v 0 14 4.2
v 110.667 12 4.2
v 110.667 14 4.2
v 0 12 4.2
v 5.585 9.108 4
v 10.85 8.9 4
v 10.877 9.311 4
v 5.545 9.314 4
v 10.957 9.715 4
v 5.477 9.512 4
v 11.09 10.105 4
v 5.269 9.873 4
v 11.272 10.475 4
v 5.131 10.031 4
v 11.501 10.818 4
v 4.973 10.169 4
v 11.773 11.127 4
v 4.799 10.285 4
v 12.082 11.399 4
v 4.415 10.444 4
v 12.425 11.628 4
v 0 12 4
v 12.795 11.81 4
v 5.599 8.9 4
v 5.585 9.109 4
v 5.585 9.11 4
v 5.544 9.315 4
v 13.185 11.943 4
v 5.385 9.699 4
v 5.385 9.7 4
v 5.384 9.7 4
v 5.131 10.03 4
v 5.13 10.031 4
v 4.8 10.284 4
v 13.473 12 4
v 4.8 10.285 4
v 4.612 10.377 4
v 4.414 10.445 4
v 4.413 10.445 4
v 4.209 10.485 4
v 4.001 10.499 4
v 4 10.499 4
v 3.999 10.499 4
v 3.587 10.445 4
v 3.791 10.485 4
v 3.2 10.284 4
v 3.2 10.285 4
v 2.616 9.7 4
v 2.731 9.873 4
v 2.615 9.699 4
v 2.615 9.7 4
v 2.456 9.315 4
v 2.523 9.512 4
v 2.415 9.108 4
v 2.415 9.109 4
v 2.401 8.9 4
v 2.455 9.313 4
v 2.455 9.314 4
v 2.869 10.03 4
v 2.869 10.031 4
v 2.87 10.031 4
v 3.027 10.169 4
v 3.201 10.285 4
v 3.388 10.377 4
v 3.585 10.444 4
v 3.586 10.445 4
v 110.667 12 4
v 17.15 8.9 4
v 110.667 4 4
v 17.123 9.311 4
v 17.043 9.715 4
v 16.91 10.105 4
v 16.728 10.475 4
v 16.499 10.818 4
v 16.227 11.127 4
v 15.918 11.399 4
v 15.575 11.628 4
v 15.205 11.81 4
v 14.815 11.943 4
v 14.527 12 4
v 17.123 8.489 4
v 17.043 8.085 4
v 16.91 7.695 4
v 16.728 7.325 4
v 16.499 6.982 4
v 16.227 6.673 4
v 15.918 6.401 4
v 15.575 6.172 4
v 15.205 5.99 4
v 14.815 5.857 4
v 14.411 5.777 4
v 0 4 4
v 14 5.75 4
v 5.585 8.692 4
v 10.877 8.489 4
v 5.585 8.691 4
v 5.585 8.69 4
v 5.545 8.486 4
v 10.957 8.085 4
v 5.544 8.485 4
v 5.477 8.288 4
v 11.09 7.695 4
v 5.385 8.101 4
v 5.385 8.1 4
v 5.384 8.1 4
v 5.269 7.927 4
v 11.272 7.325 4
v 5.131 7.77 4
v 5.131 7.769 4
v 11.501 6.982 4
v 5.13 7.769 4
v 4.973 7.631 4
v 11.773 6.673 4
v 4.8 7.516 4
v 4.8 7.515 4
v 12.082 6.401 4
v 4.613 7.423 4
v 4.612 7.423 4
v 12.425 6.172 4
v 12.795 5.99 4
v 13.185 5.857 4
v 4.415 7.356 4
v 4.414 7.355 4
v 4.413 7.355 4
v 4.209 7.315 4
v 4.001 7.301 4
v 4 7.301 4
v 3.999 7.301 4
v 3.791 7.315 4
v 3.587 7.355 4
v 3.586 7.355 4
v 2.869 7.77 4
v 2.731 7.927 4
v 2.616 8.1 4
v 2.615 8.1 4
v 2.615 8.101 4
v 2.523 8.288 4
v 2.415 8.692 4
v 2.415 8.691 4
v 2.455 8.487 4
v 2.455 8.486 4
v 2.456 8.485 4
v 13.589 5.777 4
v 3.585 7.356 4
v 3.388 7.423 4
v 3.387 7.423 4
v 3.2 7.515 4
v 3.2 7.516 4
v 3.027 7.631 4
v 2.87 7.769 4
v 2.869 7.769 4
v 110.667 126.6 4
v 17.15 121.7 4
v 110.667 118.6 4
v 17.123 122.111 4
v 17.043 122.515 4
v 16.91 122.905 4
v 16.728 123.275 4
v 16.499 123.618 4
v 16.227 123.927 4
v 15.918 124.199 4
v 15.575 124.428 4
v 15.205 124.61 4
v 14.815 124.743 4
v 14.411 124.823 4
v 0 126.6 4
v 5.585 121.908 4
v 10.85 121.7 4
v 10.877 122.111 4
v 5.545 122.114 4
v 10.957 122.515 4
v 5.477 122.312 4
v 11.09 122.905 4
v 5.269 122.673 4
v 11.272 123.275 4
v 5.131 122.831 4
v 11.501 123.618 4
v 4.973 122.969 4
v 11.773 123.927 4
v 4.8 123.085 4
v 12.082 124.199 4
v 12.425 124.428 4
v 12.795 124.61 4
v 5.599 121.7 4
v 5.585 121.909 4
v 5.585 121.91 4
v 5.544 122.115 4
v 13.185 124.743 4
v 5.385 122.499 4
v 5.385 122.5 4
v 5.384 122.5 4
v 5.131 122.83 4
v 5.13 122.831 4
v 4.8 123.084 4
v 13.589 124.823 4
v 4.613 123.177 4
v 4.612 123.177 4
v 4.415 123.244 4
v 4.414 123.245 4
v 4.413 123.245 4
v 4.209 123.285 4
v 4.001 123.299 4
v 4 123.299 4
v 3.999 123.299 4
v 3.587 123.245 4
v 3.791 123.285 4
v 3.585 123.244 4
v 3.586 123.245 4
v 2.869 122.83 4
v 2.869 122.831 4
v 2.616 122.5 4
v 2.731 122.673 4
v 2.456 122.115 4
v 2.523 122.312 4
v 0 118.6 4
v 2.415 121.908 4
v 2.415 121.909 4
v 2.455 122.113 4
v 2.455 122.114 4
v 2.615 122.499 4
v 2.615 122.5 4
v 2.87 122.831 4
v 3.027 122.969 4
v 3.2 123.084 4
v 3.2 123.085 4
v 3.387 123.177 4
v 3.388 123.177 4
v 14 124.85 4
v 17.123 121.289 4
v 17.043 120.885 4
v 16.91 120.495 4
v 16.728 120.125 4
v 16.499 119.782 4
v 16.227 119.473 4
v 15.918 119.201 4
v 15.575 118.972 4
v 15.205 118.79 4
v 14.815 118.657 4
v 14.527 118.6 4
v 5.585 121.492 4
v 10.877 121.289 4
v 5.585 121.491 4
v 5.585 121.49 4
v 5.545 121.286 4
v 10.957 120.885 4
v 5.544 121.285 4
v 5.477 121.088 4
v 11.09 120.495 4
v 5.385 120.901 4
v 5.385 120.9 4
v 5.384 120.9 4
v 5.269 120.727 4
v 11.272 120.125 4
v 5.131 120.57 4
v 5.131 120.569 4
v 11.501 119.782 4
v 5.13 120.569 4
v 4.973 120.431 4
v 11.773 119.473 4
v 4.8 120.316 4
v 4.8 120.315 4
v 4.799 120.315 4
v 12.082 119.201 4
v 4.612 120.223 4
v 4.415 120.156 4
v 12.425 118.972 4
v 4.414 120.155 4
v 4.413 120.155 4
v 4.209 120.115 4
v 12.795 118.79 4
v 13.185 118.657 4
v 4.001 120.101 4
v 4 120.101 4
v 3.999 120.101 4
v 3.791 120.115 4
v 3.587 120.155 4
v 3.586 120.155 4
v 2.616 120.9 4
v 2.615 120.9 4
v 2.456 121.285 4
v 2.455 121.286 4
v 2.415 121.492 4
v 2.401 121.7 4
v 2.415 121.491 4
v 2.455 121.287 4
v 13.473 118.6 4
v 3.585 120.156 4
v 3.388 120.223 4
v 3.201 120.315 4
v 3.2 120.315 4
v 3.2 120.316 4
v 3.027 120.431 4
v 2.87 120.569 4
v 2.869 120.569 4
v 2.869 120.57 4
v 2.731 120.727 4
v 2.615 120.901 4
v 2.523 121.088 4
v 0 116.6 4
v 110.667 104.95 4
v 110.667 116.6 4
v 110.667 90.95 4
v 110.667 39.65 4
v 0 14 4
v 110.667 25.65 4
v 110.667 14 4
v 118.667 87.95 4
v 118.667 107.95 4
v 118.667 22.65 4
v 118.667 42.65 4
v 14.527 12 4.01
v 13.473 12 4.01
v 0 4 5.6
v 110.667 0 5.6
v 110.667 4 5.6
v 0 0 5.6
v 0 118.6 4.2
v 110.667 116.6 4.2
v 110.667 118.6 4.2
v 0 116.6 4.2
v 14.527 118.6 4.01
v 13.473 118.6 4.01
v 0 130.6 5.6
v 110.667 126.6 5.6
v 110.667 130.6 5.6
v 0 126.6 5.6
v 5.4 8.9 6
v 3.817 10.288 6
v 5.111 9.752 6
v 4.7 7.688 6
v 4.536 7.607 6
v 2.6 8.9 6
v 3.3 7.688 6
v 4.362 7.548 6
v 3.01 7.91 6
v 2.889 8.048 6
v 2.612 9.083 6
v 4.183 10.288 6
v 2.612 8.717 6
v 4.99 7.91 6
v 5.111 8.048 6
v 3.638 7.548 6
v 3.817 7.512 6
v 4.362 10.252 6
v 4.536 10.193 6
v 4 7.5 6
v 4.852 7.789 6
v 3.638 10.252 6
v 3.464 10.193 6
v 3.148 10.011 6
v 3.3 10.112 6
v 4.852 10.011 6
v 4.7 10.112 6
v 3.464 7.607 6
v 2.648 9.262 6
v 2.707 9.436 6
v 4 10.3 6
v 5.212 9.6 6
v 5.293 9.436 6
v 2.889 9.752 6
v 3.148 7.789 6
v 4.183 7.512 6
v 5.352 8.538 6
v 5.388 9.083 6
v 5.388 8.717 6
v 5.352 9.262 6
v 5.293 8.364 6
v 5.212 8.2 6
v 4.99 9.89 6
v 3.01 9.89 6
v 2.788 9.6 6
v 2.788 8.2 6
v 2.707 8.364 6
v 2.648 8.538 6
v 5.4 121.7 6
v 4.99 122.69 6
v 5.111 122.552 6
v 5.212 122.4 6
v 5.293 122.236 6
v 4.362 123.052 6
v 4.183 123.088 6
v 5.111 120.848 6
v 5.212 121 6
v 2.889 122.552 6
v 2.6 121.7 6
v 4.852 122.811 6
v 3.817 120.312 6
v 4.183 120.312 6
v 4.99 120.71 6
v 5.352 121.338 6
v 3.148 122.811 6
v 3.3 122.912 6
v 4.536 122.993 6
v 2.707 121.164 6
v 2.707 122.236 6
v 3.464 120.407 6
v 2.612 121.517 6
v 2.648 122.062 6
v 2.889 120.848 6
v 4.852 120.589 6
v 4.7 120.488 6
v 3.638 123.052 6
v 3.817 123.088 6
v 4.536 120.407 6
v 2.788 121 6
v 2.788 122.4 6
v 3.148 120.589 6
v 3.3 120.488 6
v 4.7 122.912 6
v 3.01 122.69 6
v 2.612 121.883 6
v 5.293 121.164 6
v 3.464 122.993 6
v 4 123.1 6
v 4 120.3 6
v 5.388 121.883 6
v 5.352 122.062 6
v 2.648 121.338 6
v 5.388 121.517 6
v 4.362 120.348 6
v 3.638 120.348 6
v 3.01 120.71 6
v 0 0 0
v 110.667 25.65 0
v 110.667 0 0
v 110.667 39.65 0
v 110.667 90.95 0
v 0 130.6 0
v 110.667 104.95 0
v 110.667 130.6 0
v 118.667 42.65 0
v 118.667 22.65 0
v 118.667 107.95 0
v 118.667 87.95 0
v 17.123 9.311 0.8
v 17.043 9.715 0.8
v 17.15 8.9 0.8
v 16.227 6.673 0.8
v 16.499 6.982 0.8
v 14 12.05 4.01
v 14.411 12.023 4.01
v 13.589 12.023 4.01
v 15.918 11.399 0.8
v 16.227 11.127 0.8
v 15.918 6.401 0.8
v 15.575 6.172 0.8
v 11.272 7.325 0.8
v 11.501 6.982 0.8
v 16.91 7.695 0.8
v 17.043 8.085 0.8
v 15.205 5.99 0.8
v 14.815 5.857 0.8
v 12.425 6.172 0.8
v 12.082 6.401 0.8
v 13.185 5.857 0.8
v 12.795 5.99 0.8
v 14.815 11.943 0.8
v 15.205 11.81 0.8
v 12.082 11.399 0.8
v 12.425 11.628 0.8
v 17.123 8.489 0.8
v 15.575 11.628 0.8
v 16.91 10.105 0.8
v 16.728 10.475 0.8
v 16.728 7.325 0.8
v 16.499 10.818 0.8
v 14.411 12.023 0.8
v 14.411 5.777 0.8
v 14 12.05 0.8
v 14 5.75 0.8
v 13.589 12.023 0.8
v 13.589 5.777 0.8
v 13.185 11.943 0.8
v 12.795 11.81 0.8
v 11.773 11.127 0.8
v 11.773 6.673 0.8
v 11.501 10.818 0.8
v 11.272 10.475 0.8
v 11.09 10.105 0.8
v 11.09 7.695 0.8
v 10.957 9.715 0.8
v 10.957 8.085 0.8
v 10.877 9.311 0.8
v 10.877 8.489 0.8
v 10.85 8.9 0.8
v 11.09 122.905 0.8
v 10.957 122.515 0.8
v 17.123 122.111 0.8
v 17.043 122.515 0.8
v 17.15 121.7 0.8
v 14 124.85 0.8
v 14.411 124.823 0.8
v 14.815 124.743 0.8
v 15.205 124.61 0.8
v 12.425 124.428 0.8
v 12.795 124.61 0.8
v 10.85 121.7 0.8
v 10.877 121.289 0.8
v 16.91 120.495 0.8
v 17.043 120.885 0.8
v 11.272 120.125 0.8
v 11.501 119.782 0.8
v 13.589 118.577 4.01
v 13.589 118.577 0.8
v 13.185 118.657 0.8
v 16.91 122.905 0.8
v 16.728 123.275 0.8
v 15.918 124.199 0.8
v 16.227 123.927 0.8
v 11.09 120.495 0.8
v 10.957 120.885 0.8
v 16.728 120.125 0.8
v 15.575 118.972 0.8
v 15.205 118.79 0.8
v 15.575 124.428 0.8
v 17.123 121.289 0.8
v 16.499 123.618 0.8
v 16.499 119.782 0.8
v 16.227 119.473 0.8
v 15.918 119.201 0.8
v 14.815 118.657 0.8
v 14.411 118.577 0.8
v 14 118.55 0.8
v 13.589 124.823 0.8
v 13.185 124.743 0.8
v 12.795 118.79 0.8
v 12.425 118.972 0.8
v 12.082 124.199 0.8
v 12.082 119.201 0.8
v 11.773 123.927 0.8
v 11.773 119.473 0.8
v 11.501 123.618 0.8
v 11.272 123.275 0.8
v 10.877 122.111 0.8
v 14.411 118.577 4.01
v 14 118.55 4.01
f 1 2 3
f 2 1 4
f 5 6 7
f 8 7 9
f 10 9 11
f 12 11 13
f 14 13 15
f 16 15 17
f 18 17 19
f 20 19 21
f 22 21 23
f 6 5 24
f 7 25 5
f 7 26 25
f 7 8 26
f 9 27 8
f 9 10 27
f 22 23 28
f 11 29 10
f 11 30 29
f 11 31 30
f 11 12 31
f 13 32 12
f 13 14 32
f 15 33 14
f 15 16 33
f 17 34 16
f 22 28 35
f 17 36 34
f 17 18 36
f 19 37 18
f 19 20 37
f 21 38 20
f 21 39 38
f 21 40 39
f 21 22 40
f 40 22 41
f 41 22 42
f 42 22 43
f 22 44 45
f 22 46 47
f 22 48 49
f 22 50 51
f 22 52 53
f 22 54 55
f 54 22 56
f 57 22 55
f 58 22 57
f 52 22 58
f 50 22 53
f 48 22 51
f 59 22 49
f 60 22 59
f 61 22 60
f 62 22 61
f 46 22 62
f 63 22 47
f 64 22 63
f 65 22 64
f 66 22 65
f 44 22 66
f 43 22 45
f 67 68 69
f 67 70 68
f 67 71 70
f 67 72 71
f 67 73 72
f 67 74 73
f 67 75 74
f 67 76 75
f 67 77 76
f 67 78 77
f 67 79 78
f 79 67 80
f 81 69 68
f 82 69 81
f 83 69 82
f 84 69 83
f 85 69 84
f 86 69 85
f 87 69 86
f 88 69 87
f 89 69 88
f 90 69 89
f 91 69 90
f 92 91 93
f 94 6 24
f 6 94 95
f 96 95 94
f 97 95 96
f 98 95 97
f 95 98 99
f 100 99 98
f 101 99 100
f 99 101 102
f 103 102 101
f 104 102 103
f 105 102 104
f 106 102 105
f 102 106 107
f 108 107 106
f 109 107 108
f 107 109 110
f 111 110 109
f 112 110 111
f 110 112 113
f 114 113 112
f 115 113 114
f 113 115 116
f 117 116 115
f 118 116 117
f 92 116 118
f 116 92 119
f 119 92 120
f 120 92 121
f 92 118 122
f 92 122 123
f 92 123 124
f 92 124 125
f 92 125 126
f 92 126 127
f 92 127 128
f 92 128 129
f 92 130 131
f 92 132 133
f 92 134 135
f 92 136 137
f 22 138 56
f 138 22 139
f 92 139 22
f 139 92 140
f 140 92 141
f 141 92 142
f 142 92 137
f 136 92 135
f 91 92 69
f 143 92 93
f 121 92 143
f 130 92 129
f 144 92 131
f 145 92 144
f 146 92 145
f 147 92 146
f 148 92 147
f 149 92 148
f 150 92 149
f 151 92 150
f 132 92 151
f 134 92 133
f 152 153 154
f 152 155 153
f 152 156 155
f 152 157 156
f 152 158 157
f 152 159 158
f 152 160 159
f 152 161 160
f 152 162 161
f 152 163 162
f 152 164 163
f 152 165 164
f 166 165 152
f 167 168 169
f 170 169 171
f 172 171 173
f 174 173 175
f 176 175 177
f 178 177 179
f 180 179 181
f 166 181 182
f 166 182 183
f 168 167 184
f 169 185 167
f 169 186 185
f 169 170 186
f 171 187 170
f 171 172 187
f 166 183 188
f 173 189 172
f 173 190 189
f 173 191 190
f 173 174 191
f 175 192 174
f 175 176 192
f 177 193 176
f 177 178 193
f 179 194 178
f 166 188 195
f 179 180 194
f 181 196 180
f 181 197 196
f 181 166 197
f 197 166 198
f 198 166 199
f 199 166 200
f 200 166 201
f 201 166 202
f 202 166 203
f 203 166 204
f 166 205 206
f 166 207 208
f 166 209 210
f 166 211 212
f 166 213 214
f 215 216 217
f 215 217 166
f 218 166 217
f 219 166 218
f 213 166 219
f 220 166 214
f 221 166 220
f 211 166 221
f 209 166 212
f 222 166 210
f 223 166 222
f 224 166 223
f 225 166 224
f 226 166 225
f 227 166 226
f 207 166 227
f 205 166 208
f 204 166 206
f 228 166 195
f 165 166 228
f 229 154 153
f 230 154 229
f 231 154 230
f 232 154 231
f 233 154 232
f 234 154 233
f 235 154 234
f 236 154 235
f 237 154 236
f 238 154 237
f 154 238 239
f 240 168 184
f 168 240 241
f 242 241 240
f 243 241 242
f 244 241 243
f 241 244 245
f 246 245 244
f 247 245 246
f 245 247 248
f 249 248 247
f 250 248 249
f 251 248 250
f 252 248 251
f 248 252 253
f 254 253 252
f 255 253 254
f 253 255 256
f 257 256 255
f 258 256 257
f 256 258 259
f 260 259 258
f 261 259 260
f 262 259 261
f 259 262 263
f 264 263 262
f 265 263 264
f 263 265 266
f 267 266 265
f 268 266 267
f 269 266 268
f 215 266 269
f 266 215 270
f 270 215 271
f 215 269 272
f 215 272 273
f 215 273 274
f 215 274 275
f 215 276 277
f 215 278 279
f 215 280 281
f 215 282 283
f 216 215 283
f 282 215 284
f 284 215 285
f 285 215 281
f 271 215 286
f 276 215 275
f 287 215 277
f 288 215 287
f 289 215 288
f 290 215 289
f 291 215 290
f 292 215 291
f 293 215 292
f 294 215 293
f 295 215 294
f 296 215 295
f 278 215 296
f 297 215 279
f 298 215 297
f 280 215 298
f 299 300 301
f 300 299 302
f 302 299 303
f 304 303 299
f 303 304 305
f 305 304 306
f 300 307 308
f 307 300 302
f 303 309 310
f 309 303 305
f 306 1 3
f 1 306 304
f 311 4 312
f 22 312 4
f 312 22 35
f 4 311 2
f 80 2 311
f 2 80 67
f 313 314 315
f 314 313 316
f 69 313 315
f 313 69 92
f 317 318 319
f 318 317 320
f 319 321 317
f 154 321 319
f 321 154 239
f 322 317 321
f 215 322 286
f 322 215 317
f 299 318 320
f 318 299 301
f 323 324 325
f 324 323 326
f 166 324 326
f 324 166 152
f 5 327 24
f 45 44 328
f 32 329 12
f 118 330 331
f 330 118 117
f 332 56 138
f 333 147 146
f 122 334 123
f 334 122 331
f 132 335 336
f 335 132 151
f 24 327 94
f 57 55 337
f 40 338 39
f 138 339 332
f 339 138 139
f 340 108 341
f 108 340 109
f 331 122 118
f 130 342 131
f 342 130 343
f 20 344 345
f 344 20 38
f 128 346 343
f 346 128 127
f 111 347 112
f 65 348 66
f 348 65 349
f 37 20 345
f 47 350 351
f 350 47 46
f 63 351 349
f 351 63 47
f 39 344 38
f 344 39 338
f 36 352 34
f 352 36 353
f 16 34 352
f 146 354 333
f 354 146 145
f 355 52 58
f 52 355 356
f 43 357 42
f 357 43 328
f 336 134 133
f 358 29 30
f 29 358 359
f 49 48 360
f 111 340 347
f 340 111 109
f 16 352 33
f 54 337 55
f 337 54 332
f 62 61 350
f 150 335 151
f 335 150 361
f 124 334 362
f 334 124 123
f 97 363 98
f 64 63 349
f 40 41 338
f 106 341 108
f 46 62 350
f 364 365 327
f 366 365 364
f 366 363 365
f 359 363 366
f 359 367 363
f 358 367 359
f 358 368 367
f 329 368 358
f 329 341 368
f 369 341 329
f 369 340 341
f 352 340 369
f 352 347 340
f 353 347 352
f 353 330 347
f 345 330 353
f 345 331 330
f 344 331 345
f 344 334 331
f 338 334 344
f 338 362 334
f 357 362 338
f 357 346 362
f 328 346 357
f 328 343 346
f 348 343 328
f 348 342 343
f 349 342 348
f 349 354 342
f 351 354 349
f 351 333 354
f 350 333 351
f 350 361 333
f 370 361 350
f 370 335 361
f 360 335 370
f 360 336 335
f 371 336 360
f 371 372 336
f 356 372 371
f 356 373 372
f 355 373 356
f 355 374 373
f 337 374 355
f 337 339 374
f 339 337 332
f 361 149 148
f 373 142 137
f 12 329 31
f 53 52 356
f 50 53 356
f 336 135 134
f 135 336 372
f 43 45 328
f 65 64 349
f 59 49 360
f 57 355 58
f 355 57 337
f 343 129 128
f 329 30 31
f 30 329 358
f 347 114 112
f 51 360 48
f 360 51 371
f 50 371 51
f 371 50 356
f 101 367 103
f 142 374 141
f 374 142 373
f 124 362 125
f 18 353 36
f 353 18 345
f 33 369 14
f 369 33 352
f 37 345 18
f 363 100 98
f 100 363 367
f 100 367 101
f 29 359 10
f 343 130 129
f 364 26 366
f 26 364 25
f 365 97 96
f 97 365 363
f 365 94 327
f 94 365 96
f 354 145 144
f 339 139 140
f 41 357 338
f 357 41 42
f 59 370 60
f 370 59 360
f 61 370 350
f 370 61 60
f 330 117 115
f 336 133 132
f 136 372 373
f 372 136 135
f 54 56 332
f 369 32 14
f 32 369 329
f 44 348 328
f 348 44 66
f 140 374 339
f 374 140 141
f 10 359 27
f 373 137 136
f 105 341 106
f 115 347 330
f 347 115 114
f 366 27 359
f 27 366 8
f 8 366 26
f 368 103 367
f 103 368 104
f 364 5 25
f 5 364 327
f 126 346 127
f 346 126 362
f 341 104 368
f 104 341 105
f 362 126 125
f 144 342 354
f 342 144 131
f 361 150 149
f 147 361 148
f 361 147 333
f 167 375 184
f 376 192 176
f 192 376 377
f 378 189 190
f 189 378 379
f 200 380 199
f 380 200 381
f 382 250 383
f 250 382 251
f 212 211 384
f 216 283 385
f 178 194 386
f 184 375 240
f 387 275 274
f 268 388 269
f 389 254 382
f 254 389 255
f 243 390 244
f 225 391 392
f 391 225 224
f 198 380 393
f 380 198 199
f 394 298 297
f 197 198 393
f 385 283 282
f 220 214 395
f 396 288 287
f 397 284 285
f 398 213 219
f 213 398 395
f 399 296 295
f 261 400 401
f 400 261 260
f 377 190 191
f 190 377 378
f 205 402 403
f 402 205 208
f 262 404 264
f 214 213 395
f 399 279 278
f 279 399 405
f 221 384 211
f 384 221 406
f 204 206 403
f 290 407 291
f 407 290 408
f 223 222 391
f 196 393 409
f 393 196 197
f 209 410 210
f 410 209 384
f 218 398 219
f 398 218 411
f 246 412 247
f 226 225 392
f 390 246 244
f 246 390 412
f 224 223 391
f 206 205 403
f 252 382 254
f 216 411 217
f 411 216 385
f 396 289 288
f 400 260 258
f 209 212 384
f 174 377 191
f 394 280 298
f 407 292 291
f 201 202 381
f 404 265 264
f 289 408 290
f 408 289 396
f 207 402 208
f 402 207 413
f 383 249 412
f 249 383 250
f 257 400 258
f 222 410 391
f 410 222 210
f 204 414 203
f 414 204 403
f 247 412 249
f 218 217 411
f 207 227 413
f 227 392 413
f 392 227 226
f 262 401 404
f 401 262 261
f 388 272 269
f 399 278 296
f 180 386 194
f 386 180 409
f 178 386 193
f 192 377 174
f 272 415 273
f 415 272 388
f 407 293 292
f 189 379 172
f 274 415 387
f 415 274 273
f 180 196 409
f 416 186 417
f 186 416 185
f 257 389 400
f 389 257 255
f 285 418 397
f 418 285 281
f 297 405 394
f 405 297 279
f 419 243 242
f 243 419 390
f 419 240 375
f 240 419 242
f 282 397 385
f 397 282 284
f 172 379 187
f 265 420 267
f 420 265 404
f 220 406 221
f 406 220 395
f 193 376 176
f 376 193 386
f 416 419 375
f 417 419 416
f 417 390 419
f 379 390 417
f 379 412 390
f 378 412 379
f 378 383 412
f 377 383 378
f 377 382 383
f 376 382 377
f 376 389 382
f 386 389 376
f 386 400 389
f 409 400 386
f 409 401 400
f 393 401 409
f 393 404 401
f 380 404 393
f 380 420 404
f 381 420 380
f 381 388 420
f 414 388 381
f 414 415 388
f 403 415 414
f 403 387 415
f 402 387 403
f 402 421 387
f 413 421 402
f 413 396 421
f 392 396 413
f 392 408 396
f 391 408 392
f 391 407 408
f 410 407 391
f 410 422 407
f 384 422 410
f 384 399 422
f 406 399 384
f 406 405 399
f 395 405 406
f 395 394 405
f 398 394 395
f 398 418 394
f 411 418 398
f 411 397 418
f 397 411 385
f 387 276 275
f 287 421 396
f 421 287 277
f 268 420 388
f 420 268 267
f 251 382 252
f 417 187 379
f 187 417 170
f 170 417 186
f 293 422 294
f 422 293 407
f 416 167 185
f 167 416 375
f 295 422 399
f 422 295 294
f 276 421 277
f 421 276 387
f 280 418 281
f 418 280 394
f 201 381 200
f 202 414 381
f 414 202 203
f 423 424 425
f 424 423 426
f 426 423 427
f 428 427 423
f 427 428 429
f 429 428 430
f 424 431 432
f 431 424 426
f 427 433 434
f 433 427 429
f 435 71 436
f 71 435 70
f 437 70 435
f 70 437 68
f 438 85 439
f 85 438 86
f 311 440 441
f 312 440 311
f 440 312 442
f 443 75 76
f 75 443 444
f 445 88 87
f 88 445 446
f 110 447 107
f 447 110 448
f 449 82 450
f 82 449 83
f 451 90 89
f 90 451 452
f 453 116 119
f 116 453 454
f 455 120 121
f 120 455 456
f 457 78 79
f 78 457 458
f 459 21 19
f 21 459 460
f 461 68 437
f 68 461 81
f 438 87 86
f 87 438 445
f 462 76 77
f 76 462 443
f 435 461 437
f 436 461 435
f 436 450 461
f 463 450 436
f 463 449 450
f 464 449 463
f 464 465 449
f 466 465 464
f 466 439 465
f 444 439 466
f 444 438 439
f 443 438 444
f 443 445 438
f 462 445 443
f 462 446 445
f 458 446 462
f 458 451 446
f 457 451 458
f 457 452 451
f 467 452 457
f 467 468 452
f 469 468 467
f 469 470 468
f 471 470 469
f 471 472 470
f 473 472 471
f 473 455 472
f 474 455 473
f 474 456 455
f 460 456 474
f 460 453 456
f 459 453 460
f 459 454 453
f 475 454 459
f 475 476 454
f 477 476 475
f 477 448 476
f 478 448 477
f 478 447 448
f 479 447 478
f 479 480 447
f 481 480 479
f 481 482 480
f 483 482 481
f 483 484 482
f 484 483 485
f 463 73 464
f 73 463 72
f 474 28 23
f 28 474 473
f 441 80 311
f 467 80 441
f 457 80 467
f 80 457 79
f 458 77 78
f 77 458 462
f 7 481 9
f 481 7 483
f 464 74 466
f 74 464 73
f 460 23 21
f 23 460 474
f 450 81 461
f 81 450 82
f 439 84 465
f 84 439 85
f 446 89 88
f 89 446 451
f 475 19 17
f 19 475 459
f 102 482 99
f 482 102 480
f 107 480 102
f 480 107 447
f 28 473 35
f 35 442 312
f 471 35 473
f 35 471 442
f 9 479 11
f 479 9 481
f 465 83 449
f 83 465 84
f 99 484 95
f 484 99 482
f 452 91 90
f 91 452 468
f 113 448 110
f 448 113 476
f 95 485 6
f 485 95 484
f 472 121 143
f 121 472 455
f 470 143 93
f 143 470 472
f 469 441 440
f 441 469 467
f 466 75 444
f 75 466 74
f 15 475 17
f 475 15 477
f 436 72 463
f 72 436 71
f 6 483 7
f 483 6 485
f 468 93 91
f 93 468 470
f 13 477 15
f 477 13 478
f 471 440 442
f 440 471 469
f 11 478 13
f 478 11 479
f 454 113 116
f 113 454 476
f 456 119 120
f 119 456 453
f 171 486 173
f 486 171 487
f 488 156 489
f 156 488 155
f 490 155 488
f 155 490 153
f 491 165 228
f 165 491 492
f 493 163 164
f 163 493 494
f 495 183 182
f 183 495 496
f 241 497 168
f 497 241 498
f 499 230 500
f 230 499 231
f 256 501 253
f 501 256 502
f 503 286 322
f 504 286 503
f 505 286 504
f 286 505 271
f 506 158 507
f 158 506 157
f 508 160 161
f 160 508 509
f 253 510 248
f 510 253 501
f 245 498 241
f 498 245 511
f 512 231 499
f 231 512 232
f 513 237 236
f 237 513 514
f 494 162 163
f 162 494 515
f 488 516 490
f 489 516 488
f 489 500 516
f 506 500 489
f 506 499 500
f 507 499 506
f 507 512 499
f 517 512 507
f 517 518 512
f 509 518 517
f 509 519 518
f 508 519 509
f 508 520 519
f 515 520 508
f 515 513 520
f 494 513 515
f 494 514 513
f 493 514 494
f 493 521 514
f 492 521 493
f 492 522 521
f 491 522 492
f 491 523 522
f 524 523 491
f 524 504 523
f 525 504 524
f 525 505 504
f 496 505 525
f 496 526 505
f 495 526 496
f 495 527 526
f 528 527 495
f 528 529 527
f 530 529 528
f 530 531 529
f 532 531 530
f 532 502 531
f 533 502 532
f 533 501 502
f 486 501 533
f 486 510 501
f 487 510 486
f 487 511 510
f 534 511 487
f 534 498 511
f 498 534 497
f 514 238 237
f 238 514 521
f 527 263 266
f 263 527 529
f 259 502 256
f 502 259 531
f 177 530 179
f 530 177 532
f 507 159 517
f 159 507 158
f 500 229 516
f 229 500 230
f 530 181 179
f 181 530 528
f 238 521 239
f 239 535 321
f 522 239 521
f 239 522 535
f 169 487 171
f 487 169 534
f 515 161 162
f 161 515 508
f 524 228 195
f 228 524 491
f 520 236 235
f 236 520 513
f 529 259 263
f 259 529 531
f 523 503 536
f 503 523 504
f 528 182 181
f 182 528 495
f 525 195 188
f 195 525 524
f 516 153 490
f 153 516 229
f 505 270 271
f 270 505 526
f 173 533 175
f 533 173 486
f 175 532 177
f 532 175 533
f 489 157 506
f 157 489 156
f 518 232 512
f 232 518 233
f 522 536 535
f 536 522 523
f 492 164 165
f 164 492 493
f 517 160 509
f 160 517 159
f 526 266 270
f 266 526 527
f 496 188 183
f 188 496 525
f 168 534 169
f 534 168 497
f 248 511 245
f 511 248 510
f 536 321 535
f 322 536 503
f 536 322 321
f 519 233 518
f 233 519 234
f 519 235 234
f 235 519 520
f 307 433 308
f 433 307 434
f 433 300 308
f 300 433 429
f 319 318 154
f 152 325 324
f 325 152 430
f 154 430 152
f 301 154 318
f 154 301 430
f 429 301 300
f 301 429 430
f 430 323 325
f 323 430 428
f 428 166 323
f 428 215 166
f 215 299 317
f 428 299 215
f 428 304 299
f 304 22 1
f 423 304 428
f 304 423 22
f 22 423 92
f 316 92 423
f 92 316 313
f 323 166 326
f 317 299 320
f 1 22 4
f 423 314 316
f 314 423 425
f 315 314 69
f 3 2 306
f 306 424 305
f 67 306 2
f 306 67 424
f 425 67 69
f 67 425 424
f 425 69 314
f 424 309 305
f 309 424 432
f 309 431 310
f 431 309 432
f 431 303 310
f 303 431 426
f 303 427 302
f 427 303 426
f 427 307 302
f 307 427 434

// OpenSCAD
// file: ../parameters.scad
// Millimetres. Rebuild every mating part after changing these settings.
paper_width = 102;
paper_thickness = 0.30; // Measure an unexposed offcut; not a Fuji specification.
paper_side_clearance = 0.30;
guide_height = 0.20; // Below the emulsion plane: no lip over the long edges.
deck_thickness = 4;
end_allowance = 20;
side_shelf = 14;
outer_rail_width = 4;
outer_rail_height = 1.6;
mask_thickness = 4.8;
mask_edge_land = 0.8;
mask_bevel = 3.2;
mask_side_clearance = 0.4;
magnet_diameter = 6;
magnet_thickness = 3;
magnet_diameter_clearance = 0.3; // Diametral; glue fit, not a press fit.
magnet_depth_clearance = 0.2;
locator_diameter = 3.2;
locator_height = 2;
locator_clearance = 0.5; // Diametral.
cover_thickness = 3;
cover_pin_diameter = 2.8;
cover_pin_height = 2.2;
cover_pin_clearance = 0.6; // Diametral.
cover_lap = 0.8;
cover_lap_height = 1;
cover_clearance = 0.2;
joint_clearance = 0.2;
joint_depth = 8;
build_size = [180, 180, 180];
bed_margin = 3;
$fn = 48;
eps = 0.01;

image_169 = paper_width * 16 / 9;
image_43 = paper_width * 4 / 3;
base_length = image_169 + 2 * end_allowance;
channel_width = paper_width + 2 * paper_side_clearance;
base_width = channel_width + 2 * side_shelf;
rail_inner = base_width / 2 - outer_rail_width;
mask_width = 2 * (rail_inner - mask_side_clearance);
paper_z = deck_thickness + paper_thickness;
mask_top = paper_z + mask_thickness;
magnet_x = base_length / 2 - 14;
locator_x = base_length / 2 - 4;
attachment_y = channel_width / 2 + 5.1;
cover_pin_x = base_length / 2 - 10;
cover_end = base_length / 2 - 3;
band_width = paper_width / 5;
cover_lap_gap = 0.2;

function image_length(format) = format == "16:9" ? image_169 : image_43;
function band_center(i) = -paper_width / 2 + (i + 0.5) * band_width;

module check_parameters() {
    assert(paper_width >= 80 && paper_width <= 105, "Supported paper width: 80 to 105 mm.");
    assert(paper_thickness >= 0.25 && paper_thickness <= 0.6, "Measure paper thickness (0.25 to 0.6 mm).");
    assert(guide_height > 0 && guide_height <= paper_thickness - 0.05,
        "Channel guides must remain below the emulsion surface.");
    assert(paper_side_clearance >= 0.15 && paper_side_clearance <= 0.6);
    assert(deck_thickness >= magnet_thickness + magnet_depth_clearance + 0.8);
    assert(mask_thickness >= magnet_thickness + magnet_depth_clearance + 1.4);
    assert(end_allowance >= 20 && end_allowance <= 23);
    assert(mask_edge_land >= 0.8 && mask_bevel <= mask_thickness - mask_edge_land);
    assert(mask_side_clearance >= 0.25 && mask_side_clearance <= 0.6);
    assert(magnet_diameter == 6 && magnet_thickness == 3, "Attachment layout is for 6 x 3 mm magnets.");
    assert(magnet_diameter_clearance >= 0.1 && magnet_diameter_clearance <= 0.5);
    assert(magnet_depth_clearance >= 0.1 && magnet_depth_clearance <= 0.3);
    assert(mask_width / 2 - attachment_y - (magnet_diameter + magnet_diameter_clearance) / 2 >= 1.2);
    assert(locator_height + 0.3 < mask_thickness && locator_clearance >= 0.3);
    assert(cover_thickness >= 2.8 && cover_thickness <= 4);
    assert(cover_pin_height < cover_thickness && cover_pin_clearance >= 0.4);
    assert(cover_lap >= 0.6 && cover_lap <= 1);
    assert(cover_lap_height >= 0.8 && cover_lap_height + cover_lap_gap < cover_thickness);
    assert(cover_clearance >= 0.15 && cover_clearance <= 0.3);
    assert(joint_clearance >= 0.15 && joint_clearance <= 0.35);
    assert(base_length / 2 + joint_depth <= build_size[0] - 2 * bed_margin);
    assert(base_width <= build_size[1] - 2 * bed_margin);
    assert((2 * cover_end + band_width + 2 * cover_lap) / sqrt(2)
        <= min(build_size[0], build_size[1]) - 2 * bed_margin, "Diagonal cover exceeds bed.");
    children();
}
// main file
include <../parts.scad>
check_parameters() base_plate(true);
